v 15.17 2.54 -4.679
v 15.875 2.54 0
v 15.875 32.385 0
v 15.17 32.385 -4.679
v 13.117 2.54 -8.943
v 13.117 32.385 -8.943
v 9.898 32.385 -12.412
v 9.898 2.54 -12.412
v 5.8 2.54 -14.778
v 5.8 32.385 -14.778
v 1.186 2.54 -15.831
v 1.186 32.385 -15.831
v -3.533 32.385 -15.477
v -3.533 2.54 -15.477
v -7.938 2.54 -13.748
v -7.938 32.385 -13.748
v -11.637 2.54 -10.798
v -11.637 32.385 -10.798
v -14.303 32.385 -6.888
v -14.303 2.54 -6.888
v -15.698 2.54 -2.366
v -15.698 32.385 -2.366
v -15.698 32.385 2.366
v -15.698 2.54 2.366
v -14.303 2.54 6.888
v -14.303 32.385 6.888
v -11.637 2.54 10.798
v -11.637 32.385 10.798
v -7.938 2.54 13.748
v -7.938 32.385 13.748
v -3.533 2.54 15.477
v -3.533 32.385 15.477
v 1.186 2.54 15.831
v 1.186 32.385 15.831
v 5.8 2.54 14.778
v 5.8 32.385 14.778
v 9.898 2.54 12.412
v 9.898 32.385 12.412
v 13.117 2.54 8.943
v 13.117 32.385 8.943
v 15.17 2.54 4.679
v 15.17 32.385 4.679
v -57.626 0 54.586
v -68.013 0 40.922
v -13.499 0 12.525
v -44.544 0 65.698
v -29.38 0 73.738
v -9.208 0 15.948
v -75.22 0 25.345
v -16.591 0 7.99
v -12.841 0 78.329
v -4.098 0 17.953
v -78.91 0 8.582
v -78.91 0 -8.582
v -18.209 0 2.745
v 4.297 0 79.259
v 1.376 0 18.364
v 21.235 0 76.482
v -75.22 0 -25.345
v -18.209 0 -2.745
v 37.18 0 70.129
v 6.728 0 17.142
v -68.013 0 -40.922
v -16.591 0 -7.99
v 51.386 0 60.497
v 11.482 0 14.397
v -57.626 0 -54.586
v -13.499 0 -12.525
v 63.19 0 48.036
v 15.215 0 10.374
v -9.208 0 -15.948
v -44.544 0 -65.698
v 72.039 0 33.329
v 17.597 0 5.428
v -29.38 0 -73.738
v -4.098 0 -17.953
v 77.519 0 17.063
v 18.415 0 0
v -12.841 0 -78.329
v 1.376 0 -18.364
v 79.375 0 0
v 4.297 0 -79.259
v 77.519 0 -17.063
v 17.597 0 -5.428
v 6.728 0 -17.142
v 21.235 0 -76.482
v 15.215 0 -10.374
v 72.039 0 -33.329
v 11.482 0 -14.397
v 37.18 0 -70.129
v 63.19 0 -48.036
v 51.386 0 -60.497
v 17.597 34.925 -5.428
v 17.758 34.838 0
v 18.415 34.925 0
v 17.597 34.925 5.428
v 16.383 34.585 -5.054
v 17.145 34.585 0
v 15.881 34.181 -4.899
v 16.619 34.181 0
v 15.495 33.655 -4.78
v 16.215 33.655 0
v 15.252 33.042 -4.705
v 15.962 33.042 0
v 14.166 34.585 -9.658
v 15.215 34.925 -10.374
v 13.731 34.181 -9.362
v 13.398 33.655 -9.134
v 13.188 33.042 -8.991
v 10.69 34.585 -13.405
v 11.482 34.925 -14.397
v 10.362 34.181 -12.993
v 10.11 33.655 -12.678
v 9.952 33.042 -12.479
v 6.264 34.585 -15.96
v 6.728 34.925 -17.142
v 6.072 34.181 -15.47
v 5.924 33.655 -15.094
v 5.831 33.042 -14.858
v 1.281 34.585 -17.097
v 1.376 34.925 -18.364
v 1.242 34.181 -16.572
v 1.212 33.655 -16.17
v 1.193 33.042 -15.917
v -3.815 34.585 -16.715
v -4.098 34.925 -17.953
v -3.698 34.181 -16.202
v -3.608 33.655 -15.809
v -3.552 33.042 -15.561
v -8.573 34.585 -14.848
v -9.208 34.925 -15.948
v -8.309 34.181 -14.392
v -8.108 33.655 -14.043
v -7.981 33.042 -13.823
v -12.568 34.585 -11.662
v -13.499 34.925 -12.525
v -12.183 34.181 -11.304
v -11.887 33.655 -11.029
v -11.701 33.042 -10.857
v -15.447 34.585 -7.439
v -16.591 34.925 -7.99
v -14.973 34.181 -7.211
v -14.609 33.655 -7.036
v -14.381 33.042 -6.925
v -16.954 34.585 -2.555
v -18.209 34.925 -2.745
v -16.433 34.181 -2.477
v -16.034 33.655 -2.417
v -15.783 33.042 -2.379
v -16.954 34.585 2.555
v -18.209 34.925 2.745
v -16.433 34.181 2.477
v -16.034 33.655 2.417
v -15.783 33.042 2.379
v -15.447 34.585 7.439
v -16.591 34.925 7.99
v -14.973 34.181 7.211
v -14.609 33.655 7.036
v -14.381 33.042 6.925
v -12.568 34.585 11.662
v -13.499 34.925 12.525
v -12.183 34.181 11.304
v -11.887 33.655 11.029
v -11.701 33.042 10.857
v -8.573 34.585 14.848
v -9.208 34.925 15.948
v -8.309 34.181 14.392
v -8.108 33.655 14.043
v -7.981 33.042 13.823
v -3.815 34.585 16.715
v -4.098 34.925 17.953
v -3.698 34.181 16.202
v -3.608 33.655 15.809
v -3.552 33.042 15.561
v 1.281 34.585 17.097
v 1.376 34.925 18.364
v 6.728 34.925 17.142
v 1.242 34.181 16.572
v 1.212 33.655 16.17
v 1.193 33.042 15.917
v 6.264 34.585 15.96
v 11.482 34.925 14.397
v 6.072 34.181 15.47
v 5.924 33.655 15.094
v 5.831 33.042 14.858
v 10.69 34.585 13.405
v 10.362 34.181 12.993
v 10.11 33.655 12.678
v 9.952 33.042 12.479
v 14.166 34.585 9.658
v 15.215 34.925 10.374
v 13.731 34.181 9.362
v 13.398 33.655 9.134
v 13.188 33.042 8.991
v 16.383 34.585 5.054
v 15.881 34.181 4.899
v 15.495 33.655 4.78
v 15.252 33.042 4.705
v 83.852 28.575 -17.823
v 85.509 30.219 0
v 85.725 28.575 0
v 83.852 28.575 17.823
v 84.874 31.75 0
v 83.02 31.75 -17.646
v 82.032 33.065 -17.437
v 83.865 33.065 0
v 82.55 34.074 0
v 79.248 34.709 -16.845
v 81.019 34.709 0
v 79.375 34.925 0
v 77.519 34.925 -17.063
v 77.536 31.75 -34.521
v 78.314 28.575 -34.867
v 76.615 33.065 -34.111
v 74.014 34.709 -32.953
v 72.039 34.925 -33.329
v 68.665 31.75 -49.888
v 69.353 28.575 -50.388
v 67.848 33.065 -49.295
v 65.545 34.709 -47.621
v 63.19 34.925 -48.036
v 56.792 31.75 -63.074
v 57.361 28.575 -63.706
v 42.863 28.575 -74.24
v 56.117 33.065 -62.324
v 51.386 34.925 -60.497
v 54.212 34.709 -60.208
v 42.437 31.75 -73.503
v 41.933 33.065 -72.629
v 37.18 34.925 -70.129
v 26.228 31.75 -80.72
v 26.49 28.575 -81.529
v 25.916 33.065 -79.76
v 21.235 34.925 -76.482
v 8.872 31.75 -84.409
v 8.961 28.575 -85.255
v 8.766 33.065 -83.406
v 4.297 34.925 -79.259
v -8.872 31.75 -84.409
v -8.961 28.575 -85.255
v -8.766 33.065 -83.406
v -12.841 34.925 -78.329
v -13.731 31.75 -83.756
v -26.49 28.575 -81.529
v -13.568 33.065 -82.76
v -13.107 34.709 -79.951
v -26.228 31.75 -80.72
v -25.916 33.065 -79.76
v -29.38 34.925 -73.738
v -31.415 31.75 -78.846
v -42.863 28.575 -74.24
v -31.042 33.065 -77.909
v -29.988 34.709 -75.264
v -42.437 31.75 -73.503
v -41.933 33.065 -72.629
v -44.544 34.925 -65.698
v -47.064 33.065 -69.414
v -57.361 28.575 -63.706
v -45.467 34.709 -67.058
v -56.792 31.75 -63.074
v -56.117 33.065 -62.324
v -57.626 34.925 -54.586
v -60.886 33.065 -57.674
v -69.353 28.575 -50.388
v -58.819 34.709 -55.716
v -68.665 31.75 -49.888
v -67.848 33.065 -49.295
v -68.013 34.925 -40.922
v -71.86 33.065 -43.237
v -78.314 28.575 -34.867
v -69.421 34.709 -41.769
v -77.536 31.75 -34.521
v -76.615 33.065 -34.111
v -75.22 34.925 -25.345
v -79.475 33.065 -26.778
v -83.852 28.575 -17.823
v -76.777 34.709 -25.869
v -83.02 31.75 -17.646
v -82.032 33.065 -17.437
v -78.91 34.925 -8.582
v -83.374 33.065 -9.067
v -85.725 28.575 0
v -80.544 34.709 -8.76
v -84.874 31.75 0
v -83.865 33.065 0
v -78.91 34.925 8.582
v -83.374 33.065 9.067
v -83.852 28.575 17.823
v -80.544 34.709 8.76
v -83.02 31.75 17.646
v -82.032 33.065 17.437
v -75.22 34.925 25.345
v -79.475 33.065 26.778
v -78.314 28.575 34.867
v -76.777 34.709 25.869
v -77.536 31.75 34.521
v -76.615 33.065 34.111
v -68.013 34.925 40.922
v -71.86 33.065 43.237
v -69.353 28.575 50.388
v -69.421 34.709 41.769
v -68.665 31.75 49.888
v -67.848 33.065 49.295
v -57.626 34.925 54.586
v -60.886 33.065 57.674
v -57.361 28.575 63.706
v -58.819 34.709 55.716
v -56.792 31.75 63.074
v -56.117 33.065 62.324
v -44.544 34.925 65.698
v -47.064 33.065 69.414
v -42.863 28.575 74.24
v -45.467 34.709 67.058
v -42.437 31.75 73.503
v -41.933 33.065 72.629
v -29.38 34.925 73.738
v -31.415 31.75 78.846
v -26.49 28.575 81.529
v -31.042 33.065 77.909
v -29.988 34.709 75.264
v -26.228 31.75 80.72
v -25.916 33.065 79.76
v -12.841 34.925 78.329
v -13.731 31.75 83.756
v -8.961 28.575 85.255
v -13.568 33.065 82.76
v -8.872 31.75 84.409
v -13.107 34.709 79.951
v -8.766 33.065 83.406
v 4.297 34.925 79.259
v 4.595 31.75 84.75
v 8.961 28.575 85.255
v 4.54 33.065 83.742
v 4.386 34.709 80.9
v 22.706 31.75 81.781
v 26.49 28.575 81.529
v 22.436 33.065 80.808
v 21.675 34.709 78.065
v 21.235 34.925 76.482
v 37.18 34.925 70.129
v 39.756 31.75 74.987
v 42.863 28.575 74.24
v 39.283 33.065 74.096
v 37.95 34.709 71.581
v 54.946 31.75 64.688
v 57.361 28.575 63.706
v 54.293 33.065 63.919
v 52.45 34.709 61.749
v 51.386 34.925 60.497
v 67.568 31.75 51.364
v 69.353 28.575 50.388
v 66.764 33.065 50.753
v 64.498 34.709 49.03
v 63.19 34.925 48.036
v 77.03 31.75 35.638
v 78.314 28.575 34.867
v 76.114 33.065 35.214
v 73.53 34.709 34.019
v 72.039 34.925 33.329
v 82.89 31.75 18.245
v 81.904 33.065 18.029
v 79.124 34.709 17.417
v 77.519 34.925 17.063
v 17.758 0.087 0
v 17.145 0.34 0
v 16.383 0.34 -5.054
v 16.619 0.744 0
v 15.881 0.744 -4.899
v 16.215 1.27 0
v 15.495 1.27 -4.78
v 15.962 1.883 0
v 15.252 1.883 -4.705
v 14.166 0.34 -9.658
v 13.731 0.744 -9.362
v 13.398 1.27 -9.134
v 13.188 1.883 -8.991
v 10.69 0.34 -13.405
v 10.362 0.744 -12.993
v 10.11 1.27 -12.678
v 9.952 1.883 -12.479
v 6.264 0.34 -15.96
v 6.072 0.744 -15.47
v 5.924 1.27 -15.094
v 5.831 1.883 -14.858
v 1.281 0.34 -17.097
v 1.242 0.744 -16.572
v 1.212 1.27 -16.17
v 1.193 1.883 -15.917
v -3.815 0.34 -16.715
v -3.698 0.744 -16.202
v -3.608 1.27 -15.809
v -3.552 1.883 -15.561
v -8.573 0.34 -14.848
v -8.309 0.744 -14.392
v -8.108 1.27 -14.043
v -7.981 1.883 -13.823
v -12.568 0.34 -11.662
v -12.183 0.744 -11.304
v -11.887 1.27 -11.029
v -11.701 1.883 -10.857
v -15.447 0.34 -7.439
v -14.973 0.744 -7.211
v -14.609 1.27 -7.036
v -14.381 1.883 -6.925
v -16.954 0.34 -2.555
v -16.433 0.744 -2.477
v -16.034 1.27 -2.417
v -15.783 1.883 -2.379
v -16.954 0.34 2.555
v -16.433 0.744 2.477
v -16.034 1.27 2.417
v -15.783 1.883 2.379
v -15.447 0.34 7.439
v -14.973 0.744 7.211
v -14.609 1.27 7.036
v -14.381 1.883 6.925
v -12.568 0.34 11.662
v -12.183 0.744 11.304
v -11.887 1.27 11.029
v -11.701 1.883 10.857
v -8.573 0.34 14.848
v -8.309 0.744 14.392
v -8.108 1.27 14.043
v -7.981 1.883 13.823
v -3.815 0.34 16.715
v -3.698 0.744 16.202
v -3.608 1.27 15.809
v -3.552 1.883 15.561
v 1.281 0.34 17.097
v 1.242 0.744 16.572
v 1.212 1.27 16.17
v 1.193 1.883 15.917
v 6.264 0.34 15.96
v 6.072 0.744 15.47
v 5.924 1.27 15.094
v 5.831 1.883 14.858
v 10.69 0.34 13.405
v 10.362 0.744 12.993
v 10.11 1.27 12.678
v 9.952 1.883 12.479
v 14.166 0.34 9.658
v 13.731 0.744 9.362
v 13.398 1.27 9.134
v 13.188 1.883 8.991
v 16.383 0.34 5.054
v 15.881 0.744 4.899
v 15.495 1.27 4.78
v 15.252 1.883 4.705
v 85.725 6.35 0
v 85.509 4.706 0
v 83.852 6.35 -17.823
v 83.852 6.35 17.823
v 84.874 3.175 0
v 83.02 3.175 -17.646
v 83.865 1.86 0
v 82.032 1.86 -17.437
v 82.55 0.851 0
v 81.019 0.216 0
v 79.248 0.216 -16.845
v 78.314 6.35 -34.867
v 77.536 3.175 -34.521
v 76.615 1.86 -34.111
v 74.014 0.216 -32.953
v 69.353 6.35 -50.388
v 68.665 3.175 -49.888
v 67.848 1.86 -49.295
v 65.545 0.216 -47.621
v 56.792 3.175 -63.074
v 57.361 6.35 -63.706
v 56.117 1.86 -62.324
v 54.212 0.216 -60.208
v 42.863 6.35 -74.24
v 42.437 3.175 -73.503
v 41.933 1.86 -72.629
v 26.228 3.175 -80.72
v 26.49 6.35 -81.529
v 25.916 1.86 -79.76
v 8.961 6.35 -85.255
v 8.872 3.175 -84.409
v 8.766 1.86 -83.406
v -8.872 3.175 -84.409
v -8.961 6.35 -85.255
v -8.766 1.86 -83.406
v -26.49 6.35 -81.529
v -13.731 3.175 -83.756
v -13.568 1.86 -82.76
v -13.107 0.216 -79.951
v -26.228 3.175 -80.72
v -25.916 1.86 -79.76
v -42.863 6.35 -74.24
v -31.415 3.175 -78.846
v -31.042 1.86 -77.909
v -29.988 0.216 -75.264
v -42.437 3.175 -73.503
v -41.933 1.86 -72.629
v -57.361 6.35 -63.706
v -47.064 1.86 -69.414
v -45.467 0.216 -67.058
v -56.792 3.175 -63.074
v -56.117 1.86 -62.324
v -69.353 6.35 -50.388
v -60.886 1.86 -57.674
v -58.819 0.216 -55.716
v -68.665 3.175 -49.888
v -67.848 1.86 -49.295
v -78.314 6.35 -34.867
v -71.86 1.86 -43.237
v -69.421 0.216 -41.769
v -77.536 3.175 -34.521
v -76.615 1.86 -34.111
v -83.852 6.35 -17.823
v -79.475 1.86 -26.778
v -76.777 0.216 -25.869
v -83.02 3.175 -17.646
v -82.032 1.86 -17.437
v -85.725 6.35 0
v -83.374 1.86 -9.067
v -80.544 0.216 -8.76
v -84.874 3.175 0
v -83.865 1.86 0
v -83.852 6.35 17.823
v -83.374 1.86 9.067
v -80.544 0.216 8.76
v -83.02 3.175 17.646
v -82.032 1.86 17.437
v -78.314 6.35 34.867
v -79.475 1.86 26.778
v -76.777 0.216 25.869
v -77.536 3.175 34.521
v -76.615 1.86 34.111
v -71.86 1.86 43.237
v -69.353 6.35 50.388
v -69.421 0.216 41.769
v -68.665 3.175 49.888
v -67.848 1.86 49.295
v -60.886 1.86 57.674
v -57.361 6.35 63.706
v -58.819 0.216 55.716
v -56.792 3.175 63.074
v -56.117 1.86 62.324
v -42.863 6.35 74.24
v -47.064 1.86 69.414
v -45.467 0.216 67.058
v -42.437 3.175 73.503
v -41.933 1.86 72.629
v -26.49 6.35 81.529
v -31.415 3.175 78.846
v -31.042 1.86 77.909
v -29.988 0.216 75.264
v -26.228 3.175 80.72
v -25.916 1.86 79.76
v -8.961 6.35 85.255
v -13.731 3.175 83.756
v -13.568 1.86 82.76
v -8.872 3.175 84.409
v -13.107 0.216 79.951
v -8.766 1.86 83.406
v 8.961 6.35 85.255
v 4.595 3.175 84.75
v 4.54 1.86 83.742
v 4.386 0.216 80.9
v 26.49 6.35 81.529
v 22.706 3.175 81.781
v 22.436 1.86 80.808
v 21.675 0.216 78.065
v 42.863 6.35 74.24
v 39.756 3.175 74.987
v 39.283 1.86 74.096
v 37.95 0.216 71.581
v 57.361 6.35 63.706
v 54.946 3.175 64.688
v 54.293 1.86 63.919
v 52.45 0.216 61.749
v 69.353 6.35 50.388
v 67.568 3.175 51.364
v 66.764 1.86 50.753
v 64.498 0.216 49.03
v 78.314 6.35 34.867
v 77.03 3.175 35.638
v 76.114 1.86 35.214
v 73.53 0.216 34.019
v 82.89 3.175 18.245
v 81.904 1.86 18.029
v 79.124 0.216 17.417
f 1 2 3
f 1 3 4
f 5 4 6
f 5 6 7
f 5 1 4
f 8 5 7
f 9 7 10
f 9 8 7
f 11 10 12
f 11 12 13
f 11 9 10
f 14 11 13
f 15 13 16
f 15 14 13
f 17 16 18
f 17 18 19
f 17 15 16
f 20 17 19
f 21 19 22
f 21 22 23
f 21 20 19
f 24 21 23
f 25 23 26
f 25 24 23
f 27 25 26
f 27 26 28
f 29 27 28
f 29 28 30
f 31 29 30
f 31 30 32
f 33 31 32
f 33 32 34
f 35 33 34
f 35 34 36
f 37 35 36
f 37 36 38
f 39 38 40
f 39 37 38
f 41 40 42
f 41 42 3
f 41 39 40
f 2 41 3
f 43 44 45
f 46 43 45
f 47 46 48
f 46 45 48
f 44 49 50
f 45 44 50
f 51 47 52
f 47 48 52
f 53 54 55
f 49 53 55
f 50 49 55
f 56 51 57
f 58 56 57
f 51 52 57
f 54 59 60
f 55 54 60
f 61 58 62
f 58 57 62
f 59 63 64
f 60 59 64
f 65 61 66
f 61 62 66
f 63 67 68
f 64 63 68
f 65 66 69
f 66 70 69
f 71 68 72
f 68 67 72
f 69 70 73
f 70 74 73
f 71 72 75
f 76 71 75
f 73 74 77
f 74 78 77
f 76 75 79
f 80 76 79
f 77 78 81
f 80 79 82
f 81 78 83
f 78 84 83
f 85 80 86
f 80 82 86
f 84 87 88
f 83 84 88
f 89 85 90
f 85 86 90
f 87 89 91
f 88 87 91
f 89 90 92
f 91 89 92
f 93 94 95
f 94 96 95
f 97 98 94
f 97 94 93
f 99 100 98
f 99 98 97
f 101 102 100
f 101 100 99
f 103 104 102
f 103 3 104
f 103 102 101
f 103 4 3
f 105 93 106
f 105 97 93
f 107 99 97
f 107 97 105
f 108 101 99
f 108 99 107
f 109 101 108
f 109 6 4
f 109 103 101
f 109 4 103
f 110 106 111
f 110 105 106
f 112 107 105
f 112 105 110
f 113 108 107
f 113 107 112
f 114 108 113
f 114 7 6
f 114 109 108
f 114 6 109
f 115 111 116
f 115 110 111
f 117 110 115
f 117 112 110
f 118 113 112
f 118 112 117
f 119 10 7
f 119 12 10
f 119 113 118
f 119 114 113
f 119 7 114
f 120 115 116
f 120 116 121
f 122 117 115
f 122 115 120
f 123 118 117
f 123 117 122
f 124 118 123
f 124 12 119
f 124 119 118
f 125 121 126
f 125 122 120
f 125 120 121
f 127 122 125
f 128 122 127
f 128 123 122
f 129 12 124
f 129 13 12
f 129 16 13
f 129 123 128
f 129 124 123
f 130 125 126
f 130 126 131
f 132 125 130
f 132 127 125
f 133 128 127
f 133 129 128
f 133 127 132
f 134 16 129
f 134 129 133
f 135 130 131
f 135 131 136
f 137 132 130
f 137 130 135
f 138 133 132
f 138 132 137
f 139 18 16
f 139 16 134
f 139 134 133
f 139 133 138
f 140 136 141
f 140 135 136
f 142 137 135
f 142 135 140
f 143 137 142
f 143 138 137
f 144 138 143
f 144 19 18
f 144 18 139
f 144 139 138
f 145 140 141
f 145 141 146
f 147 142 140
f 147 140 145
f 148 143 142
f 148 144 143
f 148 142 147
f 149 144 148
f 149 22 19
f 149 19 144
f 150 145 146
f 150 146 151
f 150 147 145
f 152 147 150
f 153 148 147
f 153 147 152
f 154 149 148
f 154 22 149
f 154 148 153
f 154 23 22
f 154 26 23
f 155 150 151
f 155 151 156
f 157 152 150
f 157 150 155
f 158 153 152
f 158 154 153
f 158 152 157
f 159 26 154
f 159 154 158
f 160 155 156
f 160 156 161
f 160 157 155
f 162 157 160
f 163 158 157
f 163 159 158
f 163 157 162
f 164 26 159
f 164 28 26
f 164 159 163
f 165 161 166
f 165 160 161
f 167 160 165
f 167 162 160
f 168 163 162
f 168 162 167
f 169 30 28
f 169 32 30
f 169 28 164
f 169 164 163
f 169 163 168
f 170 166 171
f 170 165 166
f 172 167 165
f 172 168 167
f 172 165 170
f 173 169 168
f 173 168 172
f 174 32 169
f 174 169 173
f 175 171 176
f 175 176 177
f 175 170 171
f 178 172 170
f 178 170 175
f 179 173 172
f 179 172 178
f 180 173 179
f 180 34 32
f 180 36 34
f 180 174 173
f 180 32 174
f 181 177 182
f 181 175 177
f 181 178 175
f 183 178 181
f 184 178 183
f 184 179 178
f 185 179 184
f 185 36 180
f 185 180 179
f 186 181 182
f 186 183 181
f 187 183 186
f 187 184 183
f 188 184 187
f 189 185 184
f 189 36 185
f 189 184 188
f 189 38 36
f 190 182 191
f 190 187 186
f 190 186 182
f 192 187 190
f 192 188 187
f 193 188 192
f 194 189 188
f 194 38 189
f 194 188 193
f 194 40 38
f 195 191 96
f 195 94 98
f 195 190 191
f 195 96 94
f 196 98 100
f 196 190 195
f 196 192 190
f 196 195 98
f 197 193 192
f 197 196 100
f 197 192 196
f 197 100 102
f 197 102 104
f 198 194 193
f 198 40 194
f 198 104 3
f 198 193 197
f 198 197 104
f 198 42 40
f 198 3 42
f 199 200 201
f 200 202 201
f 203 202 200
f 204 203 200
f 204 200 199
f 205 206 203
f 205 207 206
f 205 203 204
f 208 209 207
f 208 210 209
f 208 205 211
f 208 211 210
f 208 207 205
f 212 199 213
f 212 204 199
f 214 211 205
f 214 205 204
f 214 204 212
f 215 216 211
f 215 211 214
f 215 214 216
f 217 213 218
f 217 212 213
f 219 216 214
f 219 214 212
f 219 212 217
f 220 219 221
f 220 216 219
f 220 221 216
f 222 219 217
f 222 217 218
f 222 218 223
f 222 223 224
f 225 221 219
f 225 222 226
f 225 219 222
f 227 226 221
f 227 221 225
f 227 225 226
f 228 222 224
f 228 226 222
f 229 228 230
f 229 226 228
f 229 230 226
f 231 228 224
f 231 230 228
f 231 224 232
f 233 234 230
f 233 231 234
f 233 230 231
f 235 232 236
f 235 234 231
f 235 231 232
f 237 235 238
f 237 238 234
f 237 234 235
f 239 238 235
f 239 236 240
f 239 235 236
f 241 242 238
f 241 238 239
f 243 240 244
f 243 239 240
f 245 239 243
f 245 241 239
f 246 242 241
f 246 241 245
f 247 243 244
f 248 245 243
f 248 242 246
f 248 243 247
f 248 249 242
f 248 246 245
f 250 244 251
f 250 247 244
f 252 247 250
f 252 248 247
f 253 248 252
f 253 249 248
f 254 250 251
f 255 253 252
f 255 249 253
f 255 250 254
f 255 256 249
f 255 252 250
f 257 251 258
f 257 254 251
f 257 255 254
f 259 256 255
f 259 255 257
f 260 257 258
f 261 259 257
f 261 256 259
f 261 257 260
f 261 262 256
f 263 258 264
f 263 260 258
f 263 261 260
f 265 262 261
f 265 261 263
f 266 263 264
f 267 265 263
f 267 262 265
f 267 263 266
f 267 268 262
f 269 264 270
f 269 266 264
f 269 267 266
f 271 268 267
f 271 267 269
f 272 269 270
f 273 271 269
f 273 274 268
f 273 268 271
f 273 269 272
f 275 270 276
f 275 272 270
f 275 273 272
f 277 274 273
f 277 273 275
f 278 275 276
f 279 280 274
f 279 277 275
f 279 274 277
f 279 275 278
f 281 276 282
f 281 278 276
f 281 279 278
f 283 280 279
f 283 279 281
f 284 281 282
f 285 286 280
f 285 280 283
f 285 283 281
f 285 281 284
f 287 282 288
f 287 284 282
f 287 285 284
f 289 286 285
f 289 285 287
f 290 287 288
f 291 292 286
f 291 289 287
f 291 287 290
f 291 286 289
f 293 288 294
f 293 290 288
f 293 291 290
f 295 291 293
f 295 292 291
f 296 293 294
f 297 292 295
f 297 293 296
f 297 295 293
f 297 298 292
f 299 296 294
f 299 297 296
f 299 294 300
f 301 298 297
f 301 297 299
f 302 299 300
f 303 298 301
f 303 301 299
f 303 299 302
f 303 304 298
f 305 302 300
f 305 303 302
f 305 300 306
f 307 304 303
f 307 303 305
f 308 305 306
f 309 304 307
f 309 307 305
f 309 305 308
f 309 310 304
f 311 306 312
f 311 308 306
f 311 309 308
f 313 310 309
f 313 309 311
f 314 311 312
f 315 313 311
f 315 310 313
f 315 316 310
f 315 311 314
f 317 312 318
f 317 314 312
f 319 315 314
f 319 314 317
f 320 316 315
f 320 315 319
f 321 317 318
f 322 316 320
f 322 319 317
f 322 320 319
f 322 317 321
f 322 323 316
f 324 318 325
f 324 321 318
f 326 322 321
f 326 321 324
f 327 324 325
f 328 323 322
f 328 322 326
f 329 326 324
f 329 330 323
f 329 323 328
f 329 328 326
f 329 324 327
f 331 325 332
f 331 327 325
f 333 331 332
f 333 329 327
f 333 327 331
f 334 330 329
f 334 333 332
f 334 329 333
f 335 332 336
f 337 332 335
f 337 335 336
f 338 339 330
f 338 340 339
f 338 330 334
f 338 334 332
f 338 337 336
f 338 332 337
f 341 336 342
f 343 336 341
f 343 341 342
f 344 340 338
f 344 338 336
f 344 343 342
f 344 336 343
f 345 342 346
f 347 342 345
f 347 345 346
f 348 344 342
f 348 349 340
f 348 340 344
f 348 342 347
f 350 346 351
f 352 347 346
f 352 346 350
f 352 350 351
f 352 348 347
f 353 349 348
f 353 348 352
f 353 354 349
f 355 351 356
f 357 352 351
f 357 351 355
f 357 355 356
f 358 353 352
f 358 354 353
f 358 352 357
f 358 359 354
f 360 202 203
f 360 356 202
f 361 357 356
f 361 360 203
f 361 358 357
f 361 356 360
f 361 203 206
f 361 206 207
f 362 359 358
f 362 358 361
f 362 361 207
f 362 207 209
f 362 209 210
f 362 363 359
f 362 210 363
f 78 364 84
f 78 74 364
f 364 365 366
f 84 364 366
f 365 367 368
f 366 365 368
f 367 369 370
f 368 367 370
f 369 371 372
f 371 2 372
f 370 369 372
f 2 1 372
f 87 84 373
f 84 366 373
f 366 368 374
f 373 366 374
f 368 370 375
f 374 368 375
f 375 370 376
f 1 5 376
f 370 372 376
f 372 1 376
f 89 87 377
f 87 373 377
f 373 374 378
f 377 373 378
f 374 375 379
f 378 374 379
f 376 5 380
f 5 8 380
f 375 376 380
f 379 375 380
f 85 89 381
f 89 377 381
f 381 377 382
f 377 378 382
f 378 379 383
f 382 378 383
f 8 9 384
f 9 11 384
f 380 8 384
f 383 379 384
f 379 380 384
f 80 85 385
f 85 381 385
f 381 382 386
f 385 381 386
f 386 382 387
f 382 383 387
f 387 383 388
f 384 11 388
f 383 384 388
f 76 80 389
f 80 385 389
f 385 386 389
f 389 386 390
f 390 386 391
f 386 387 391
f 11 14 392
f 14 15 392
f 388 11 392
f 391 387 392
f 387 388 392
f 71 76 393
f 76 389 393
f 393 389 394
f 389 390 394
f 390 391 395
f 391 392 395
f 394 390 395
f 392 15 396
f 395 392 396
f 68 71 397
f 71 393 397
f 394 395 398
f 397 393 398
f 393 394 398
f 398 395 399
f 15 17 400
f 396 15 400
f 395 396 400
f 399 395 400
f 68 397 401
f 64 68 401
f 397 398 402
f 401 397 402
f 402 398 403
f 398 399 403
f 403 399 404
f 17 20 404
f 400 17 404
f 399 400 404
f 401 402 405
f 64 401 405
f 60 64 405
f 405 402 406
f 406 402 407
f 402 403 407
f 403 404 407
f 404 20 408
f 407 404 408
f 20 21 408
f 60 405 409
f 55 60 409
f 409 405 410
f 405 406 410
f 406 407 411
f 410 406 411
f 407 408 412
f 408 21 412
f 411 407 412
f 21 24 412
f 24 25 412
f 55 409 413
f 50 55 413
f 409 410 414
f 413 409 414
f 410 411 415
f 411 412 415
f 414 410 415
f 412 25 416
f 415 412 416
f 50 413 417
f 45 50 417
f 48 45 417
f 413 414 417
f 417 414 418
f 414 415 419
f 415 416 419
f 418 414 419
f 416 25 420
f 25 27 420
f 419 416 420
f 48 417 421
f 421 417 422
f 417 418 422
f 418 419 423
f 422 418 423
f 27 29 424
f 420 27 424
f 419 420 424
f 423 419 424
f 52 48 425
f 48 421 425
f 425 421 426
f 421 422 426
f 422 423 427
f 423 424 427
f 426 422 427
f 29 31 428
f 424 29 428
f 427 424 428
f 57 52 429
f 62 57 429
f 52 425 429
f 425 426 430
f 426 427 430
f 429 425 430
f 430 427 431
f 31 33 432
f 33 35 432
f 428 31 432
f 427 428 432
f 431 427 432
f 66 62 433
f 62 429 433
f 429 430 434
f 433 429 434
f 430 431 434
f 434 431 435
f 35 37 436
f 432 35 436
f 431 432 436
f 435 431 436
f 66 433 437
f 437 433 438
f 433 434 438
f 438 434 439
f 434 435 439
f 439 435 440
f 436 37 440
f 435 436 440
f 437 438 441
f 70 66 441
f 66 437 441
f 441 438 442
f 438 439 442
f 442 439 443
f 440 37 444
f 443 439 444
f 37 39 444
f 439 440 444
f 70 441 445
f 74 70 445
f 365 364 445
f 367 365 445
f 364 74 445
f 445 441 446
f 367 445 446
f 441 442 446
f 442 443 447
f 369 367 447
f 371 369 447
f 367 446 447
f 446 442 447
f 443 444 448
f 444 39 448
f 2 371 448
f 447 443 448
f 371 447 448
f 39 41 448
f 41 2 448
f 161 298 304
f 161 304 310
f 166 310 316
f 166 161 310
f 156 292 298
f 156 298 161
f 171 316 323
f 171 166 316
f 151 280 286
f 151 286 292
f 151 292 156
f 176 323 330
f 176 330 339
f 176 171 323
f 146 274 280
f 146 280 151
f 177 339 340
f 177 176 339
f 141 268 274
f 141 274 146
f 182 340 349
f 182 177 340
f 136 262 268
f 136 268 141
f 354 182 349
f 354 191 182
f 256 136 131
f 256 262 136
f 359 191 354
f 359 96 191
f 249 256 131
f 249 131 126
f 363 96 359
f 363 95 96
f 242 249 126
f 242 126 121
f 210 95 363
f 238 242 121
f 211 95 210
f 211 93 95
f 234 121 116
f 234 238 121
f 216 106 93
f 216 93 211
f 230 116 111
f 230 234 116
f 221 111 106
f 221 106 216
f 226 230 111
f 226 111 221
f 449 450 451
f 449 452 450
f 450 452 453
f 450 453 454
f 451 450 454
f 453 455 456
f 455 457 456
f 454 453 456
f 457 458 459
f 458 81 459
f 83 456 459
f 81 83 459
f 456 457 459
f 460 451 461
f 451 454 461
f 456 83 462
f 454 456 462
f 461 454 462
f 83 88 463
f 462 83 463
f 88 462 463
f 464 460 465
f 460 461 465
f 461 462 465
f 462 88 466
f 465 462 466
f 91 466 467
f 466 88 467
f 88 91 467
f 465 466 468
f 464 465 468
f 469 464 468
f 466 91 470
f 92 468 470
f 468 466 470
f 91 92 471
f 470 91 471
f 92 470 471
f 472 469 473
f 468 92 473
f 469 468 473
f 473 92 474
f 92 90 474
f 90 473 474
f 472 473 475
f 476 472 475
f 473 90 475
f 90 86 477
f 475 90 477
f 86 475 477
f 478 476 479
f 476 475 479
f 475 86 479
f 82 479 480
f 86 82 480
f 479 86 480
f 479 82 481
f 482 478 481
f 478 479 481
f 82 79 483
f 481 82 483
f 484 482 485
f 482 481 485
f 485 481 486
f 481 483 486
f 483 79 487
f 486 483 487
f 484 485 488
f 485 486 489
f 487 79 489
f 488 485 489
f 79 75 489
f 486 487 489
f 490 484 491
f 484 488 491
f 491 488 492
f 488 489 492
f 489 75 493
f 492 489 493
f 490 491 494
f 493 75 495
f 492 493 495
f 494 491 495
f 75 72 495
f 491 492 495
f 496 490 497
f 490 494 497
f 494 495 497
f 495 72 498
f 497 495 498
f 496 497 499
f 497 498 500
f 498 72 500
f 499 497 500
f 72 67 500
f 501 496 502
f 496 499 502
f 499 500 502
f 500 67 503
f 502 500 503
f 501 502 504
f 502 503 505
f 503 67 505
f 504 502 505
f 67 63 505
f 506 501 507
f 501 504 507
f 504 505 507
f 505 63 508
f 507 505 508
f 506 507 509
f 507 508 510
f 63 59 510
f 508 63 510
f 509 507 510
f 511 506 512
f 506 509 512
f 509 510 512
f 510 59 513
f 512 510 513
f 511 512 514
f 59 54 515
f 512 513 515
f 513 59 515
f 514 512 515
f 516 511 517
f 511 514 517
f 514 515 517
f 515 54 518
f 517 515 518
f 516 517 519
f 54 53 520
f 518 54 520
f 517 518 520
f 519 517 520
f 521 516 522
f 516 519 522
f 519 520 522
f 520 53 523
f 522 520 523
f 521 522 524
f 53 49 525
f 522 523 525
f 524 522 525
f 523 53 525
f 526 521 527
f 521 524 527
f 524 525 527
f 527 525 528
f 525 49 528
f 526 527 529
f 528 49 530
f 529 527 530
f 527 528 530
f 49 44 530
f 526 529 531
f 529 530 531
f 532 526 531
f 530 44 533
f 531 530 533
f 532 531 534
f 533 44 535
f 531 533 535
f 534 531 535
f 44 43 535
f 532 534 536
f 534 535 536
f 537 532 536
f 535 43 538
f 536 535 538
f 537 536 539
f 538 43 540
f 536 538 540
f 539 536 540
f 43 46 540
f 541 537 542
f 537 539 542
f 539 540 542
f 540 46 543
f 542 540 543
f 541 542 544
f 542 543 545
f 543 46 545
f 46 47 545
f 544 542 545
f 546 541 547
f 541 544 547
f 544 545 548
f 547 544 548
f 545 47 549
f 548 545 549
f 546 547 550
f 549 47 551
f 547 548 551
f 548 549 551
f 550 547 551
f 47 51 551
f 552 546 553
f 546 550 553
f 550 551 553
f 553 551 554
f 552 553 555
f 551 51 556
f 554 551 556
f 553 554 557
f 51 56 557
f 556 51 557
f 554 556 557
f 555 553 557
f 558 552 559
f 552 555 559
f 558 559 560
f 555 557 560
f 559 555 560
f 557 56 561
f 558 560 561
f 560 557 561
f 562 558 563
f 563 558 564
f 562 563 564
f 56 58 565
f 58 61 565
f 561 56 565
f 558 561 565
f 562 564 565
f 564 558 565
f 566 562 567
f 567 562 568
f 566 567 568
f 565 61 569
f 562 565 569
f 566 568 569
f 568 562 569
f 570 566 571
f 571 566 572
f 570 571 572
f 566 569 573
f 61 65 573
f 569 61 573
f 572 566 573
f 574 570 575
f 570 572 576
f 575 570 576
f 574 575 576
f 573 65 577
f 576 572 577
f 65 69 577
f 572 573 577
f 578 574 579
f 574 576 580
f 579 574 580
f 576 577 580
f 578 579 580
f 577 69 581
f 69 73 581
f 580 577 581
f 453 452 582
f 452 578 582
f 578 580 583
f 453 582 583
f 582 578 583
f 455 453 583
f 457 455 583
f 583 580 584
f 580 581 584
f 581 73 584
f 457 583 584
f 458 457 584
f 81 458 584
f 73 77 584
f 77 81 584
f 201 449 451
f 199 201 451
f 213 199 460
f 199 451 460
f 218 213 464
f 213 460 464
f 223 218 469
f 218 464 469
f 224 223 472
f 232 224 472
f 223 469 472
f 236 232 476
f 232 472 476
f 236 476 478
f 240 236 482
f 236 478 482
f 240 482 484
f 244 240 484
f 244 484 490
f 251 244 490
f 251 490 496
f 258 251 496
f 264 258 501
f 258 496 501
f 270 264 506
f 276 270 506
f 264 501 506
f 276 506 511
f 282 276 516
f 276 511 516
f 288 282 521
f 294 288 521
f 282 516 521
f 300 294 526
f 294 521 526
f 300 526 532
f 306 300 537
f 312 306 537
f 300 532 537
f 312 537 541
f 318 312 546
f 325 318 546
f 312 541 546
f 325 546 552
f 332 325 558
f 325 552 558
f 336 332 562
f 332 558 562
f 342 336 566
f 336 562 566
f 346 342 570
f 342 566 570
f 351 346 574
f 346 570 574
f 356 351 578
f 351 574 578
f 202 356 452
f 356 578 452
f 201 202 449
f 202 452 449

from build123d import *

# Parameters (mm, degrees)
SKETCH1_R           = 85.725
SKETCH1_R_2         = 15.875
BOSS_EXTRUDE1_DEPTH = 34.925
FILLET1_R           = 6.35
FILLET2_R           = 2.54


with BuildPart() as part:
    # Sketch1 → Boss-Extrude1 (new body)
    with BuildSketch(Plane(origin=(0, 0, 0), x_dir=(1, 0, 0), z_dir=(0, 1, 0))):
        Circle(SKETCH1_R)
        Circle(SKETCH1_R_2, mode=Mode.SUBTRACT)
    extrude(amount=BOSS_EXTRUDE1_DEPTH)

    # Fillet1
    fillet1_edges = [part.edges().sort_by_distance(p)[0] for p in [
        (-85.725, 0, 0),
        (-85.725, 34.925, 0),
    ]]
    fillet(fillet1_edges, radius=FILLET1_R)

    # Fillet2
    fillet2_edges = [part.edges().sort_by_distance(p)[0] for p in [
        (-15.875, 0, 0),
        (-15.875, 34.925, 0),
    ]]
    fillet(fillet2_edges, radius=FILLET2_R)


solid = part.part
